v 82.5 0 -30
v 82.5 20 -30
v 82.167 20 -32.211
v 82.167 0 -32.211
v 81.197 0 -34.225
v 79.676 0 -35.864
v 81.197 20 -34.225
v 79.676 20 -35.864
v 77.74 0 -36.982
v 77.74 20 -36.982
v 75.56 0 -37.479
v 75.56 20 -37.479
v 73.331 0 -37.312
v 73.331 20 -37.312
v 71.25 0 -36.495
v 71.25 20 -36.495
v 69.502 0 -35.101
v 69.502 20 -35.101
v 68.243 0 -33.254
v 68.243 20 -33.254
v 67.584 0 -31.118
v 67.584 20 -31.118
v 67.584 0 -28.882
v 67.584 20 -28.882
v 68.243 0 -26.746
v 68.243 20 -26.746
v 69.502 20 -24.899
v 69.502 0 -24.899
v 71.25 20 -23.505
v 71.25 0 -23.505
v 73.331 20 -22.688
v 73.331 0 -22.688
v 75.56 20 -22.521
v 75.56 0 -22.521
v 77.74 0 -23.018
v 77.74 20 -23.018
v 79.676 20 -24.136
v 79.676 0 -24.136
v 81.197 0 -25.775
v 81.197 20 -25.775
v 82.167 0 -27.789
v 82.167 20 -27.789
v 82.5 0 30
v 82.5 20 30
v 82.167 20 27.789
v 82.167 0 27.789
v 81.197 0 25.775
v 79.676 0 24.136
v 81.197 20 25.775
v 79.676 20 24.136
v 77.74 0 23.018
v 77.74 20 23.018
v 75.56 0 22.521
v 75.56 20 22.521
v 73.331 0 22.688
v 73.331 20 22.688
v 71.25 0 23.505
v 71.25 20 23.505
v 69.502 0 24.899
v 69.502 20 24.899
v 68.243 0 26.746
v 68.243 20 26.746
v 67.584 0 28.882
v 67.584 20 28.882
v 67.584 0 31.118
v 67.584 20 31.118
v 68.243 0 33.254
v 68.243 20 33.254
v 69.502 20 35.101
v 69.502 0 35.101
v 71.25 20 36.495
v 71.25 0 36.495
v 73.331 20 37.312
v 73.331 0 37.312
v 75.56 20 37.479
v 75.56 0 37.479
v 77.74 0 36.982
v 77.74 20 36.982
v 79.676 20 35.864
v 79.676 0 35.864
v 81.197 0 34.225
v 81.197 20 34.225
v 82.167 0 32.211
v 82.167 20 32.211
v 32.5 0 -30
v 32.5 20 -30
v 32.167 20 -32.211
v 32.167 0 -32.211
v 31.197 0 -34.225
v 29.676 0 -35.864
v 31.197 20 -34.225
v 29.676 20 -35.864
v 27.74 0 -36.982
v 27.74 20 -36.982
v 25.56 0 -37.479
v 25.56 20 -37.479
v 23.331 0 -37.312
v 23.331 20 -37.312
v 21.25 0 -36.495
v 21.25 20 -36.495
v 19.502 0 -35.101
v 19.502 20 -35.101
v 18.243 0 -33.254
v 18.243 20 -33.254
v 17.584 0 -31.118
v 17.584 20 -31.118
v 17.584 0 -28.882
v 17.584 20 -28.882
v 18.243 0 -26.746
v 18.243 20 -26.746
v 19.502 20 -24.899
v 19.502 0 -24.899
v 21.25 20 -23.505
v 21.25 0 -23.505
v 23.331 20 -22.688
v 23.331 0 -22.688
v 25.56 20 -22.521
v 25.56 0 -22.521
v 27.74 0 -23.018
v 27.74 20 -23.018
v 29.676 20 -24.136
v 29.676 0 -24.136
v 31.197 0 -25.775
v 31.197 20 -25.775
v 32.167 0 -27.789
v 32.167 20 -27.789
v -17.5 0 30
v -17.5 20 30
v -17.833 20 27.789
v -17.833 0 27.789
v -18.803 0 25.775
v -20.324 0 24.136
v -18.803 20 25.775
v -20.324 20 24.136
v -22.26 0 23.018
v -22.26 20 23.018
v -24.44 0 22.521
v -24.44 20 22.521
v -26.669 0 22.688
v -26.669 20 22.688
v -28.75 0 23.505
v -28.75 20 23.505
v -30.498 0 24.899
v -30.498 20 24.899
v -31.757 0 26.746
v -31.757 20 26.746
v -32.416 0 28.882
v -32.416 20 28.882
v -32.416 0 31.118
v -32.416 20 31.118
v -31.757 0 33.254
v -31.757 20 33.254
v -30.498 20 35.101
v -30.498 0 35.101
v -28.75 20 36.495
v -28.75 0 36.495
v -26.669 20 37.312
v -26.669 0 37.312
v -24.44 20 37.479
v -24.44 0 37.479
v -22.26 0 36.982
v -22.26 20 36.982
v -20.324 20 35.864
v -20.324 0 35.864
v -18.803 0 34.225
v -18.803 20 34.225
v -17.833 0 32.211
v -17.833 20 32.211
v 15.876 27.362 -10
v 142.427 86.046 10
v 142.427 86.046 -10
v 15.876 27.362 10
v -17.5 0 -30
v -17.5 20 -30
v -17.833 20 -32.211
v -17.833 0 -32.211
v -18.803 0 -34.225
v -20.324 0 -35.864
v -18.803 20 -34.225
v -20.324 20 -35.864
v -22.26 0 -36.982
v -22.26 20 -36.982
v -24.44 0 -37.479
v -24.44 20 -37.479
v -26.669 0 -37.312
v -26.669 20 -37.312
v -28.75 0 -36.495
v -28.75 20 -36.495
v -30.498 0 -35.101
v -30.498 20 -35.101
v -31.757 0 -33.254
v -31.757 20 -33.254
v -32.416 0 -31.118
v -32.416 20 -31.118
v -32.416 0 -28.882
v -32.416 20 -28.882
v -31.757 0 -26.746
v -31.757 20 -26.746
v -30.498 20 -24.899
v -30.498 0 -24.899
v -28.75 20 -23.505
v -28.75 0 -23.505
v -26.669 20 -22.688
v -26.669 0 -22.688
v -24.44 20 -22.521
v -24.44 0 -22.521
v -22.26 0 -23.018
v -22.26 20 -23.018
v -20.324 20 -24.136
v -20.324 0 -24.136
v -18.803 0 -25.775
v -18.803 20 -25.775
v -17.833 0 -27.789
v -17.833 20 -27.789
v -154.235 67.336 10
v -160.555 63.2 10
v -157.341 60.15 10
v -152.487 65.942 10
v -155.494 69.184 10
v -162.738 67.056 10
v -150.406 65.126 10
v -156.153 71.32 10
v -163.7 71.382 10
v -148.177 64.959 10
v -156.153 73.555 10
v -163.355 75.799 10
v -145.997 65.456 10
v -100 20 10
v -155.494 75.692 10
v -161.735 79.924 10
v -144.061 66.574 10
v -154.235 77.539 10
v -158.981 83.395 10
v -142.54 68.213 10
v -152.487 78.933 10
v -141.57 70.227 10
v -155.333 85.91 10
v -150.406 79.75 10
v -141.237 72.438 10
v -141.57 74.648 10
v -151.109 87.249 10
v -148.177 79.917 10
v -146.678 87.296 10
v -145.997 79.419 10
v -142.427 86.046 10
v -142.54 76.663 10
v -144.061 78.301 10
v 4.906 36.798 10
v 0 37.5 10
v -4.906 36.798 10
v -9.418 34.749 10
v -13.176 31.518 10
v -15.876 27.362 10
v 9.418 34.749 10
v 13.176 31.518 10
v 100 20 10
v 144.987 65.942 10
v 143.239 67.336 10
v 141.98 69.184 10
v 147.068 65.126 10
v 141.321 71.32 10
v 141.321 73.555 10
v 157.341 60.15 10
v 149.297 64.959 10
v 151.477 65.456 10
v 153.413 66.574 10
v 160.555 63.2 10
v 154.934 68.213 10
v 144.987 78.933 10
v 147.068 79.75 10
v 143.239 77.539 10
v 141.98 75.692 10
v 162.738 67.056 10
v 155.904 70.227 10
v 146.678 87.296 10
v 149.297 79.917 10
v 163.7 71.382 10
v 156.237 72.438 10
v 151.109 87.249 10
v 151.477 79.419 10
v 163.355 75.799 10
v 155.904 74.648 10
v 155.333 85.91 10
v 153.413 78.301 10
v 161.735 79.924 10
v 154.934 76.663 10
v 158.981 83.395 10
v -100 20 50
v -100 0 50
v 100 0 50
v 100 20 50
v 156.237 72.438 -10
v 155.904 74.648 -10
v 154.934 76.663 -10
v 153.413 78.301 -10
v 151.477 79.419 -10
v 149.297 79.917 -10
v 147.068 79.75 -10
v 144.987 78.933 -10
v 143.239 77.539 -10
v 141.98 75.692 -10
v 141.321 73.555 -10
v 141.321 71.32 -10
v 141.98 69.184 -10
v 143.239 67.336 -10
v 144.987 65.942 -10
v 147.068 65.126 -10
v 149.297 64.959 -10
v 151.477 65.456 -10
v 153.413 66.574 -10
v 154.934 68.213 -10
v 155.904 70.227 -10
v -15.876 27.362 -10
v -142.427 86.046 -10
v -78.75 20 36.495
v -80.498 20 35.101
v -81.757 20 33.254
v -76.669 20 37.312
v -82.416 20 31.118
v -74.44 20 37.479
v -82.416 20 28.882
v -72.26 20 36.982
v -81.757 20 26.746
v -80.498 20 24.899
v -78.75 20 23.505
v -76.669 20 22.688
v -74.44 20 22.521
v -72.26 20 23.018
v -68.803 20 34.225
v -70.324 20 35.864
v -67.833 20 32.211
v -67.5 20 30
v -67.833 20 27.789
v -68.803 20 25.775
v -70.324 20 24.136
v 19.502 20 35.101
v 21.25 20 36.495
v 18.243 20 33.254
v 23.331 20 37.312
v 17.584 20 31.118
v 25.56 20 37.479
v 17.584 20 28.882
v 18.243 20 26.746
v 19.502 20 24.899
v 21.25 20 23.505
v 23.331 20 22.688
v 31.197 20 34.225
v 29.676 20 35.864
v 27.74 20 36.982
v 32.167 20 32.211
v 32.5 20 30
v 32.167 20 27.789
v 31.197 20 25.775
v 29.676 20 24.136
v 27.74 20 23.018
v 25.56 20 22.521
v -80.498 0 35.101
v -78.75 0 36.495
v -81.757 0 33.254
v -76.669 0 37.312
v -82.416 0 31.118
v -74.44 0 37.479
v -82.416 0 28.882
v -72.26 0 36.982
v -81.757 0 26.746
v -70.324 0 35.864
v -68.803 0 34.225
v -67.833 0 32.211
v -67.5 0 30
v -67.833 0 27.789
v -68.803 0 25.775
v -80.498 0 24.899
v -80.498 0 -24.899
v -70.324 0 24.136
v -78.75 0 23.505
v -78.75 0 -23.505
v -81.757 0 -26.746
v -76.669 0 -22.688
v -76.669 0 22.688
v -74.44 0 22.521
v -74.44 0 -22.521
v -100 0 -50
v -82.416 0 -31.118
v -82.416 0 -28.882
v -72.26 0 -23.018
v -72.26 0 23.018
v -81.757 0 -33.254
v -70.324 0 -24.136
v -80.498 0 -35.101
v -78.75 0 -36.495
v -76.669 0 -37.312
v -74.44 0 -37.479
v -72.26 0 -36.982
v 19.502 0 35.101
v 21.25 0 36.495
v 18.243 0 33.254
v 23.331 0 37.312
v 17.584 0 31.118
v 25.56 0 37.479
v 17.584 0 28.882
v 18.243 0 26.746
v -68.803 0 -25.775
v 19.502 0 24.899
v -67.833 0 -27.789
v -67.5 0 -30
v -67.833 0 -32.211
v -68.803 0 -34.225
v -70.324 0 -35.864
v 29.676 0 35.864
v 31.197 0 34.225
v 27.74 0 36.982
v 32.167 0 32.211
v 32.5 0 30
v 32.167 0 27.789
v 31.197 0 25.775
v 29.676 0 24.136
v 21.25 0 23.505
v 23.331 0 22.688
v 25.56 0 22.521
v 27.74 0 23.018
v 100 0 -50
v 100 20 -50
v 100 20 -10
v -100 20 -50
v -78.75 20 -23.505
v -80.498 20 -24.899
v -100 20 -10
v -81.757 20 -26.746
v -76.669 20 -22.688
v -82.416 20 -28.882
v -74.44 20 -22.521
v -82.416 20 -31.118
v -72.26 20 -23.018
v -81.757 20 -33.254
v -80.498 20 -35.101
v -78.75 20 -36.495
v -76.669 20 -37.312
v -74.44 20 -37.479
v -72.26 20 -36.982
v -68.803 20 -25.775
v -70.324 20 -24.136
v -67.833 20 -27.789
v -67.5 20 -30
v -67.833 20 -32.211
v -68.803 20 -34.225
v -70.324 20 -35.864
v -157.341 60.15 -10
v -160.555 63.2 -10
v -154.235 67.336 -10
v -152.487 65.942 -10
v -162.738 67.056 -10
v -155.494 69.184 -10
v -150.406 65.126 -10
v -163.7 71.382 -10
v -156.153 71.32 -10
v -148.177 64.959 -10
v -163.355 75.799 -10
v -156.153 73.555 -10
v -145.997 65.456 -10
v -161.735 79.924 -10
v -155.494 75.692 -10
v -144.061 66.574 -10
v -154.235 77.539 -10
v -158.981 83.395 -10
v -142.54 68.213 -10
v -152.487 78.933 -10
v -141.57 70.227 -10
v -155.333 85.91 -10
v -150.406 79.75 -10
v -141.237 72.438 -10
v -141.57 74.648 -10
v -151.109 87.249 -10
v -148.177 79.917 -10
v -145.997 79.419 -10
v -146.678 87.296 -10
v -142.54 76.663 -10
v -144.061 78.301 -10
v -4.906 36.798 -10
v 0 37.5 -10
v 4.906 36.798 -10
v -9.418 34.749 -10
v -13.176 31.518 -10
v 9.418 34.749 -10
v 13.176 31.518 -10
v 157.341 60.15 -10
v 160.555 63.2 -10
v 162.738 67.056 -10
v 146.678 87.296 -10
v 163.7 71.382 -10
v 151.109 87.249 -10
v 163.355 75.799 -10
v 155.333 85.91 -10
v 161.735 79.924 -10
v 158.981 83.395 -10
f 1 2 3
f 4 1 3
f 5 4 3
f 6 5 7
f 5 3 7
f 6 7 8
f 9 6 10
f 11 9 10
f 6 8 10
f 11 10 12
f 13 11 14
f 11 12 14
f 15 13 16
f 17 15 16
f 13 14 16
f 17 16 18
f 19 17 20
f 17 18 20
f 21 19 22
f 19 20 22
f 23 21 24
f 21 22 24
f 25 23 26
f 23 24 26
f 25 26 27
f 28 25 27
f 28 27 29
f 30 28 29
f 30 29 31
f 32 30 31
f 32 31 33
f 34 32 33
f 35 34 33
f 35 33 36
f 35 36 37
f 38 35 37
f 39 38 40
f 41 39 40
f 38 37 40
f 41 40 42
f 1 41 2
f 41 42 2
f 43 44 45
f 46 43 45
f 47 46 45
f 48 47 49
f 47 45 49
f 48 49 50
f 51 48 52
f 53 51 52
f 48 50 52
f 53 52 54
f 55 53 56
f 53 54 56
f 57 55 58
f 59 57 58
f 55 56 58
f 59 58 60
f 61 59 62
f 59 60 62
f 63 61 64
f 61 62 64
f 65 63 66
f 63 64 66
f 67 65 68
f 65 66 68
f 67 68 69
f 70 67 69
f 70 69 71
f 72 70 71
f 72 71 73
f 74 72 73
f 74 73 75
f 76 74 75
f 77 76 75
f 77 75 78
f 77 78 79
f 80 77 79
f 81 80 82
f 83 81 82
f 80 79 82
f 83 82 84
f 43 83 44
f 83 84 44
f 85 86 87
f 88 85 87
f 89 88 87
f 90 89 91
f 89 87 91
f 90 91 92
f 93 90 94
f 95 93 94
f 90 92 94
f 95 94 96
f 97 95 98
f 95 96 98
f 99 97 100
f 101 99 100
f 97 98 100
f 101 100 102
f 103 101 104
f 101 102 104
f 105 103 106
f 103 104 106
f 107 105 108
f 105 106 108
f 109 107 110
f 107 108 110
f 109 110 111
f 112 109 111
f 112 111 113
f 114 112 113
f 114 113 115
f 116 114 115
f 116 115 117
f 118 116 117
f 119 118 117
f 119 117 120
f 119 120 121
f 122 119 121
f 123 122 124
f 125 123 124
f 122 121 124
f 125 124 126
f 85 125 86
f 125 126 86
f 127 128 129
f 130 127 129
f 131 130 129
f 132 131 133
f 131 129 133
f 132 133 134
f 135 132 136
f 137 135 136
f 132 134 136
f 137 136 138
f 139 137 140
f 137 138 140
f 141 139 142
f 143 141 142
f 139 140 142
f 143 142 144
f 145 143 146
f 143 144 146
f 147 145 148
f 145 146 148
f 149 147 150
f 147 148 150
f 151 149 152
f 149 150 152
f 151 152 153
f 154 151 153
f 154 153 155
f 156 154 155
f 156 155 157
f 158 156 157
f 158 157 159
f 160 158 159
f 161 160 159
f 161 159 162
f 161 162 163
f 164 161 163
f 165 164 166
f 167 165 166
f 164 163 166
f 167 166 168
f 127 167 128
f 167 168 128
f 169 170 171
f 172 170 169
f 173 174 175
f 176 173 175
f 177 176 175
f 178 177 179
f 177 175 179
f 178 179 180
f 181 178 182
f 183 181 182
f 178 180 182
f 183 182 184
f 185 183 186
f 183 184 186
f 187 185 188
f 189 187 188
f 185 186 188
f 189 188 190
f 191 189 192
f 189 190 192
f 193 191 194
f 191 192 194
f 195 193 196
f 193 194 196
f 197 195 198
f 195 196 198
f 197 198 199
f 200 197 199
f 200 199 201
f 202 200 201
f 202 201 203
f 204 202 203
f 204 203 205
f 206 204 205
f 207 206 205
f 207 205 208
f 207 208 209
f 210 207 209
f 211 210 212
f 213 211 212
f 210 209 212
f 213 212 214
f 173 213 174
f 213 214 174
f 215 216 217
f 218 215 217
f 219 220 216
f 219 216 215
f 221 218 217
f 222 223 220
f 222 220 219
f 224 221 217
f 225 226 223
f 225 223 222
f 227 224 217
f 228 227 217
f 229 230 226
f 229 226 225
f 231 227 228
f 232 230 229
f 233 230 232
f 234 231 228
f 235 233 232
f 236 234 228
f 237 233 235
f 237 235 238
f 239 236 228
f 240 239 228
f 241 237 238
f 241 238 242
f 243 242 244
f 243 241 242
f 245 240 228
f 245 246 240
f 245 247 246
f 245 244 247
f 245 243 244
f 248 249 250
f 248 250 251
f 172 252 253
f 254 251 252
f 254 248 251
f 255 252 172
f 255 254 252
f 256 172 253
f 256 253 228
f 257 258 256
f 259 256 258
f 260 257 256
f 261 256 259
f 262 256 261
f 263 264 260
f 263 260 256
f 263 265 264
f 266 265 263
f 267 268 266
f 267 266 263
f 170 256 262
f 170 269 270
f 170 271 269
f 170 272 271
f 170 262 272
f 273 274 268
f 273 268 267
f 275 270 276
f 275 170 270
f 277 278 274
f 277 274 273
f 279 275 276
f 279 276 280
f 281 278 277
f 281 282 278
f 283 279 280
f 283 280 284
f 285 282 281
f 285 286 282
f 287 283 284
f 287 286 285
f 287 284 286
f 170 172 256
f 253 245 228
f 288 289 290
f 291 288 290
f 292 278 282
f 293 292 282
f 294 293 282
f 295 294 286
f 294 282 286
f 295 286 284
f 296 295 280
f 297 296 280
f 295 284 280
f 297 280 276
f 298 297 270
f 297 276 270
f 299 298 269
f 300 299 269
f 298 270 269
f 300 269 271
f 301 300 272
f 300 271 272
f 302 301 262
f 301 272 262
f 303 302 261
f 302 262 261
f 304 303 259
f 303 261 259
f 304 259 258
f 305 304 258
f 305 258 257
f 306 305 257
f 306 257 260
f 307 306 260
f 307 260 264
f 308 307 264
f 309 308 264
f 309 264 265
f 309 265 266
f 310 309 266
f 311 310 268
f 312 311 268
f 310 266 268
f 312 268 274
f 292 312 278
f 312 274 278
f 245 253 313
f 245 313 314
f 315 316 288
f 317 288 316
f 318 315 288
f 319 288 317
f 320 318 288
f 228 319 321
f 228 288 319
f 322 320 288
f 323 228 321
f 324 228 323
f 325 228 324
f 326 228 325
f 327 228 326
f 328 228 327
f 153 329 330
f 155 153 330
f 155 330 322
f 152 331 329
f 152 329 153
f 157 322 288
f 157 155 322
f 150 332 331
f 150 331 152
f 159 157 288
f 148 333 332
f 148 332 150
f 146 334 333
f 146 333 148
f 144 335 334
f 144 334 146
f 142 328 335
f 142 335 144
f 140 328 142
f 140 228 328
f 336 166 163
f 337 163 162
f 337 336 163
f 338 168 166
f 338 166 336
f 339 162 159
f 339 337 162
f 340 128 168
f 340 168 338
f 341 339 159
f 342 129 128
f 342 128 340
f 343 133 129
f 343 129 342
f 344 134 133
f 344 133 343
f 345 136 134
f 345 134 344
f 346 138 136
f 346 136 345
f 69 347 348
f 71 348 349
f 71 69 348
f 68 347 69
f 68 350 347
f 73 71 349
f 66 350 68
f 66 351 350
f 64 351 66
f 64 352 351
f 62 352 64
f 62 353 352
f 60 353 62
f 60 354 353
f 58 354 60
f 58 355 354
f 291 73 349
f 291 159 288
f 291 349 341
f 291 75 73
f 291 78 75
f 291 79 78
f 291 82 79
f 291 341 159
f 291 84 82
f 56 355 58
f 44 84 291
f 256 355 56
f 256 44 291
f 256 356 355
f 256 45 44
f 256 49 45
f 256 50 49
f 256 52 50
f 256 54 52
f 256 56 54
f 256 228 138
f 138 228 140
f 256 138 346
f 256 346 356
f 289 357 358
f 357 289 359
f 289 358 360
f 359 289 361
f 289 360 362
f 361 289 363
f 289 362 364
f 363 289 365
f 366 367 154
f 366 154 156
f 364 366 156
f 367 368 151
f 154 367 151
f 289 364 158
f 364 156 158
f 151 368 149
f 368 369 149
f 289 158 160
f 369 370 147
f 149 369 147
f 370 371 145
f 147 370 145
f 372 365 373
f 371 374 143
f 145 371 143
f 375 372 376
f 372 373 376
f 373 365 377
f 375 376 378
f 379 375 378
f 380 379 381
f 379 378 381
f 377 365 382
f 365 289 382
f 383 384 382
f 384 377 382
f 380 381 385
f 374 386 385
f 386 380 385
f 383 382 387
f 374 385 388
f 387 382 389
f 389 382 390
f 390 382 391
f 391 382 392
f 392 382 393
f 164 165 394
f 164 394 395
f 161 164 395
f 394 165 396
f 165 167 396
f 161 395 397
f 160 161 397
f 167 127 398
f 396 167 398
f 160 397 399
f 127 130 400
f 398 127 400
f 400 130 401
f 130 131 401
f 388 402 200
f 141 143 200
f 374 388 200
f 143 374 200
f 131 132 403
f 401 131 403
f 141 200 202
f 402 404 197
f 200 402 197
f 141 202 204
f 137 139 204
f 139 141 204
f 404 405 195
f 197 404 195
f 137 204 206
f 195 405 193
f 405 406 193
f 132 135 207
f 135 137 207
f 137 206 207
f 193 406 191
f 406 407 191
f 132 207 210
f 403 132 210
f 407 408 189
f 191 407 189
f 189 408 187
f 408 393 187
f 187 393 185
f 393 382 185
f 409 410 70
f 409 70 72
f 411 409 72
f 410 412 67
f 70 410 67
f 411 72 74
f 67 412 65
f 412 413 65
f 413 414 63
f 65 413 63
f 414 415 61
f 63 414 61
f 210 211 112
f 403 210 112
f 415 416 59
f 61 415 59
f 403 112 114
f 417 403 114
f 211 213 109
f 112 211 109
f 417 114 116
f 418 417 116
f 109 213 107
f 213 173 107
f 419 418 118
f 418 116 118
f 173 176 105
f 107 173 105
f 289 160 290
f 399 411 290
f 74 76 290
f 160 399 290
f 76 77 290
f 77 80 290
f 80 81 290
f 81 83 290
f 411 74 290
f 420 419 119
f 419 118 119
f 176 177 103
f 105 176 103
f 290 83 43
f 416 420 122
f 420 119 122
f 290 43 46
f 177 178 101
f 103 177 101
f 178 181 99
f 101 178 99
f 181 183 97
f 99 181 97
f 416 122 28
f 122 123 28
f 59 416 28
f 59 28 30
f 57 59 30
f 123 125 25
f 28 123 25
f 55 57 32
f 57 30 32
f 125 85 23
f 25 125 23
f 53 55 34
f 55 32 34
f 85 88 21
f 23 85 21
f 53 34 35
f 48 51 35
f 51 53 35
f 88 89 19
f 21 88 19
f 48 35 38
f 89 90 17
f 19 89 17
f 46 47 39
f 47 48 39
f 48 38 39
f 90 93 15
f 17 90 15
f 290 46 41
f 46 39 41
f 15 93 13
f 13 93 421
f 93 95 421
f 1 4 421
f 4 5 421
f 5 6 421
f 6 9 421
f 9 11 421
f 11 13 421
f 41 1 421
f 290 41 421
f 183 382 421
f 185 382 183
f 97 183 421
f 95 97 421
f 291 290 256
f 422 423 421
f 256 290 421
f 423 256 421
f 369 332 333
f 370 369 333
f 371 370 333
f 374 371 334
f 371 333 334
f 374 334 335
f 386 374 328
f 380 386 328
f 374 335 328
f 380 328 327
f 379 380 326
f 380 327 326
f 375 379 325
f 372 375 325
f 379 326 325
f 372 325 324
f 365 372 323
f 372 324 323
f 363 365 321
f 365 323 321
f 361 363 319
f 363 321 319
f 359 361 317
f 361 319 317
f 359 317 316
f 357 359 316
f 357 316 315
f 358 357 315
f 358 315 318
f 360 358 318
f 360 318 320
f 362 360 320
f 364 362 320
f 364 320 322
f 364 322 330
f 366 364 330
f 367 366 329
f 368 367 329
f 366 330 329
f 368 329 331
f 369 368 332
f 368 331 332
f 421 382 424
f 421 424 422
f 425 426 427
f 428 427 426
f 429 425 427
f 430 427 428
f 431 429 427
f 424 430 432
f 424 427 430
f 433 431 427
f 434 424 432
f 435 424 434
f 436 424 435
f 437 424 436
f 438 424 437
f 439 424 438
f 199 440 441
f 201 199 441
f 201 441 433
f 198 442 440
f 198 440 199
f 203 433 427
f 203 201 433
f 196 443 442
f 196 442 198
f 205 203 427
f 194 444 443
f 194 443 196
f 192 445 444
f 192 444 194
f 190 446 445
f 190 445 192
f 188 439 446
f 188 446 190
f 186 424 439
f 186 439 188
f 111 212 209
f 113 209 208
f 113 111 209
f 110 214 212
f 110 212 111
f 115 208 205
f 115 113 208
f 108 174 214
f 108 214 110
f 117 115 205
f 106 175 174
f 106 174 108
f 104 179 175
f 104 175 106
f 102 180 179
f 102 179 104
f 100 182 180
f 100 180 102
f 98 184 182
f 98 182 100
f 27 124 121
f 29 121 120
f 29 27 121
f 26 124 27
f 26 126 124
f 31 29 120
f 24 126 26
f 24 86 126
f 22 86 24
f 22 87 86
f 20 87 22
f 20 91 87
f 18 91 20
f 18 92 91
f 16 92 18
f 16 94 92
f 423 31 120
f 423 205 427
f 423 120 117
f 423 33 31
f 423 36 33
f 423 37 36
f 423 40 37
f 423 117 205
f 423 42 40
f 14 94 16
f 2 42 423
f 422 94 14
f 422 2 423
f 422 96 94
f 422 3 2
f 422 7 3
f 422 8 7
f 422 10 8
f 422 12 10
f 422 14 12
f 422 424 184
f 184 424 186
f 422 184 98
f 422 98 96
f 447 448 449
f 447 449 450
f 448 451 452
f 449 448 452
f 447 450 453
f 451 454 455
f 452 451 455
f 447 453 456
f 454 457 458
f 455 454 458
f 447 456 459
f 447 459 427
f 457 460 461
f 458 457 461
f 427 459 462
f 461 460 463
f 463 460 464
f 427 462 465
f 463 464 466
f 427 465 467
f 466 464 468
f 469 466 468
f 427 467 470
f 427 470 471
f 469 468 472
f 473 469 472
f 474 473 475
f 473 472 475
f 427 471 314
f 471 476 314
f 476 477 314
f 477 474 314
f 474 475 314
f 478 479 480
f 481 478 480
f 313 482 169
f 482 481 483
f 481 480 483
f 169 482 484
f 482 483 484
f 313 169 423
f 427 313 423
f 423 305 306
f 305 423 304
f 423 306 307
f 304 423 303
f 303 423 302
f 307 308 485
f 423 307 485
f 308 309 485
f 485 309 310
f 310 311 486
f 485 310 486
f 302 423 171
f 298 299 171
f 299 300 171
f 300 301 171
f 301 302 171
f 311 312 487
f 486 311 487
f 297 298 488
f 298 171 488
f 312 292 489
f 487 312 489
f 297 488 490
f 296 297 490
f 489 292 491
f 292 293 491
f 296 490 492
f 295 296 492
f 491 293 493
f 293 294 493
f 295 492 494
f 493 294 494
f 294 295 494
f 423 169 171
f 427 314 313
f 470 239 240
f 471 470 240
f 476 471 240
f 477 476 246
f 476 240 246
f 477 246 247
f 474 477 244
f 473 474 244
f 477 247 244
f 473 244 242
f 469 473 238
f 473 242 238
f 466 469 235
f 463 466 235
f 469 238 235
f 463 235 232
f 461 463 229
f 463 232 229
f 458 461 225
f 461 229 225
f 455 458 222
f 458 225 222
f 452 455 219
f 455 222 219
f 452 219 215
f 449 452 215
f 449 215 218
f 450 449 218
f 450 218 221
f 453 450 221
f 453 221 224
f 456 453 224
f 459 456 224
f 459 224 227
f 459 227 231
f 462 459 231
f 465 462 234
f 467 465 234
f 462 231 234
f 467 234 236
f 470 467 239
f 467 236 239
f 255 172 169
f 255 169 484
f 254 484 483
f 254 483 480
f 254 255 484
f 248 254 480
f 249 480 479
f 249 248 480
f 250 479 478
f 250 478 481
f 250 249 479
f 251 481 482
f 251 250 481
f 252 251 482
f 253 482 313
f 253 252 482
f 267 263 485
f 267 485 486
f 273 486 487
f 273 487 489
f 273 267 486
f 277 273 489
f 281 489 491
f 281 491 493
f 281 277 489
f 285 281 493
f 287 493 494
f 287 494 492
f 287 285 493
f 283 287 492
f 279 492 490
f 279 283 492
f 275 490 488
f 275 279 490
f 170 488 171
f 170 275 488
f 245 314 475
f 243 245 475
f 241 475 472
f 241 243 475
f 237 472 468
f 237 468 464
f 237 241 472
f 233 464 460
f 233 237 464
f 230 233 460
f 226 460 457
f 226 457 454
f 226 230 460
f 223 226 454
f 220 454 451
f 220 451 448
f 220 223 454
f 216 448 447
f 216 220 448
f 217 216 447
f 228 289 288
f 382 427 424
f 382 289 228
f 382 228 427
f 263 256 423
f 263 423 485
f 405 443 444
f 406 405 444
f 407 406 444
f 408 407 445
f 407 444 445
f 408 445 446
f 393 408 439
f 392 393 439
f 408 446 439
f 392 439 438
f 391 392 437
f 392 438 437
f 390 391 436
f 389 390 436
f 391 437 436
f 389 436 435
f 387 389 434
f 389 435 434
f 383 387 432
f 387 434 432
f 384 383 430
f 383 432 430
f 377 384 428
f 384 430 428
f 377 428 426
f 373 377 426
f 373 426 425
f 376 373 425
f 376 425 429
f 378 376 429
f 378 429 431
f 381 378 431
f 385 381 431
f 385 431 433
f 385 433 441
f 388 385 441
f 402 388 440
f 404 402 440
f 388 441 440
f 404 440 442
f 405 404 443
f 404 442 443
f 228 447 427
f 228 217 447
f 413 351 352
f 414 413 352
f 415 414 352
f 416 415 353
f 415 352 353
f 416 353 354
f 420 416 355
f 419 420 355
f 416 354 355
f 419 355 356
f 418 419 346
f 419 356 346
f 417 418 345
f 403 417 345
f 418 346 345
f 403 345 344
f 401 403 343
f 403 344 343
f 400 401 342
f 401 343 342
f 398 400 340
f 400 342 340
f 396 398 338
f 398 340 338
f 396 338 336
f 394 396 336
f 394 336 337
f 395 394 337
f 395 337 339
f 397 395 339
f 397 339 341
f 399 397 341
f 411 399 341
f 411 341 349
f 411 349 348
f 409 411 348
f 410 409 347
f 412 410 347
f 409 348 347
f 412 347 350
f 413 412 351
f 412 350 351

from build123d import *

# Parameters (mm, degrees)
SKETCH1_W           = 200
SKETCH1_H           = 100
BOSS_EXTRUDE1_DEPTH = 20
SKETCH2_R           = 7.5
CUT_EXTRUDE1_DEPTH  = 20
BOSS_EXTRUDE2_DEPTH = 10
SKETCH4_R           = 7.5
CUT_EXTRUDE2_DEPTH  = 20


with BuildPart() as part:
    # Sketch1 → Boss-Extrude1 (new body)
    with BuildSketch(Plane(origin=(0, 0, 0), x_dir=(1, 0, 0), z_dir=(0, 1, 0))):
        Rectangle(SKETCH1_W, SKETCH1_H)
    extrude(amount=BOSS_EXTRUDE1_DEPTH)

    # Sketch2 → Cut-Extrude1 (cut)
    with BuildSketch(Plane(origin=(0, 20, 0), x_dir=(1, 0, 0), z_dir=(0, 1, 0))):
        with Locations((-75, 30)):
            Circle(SKETCH2_R)
        with Locations((-25, 30)):
            Circle(SKETCH2_R)
        with Locations((25, 30)):
            Circle(SKETCH2_R)
        with Locations((75, 30)):
            Circle(SKETCH2_R)
        with Locations((-75, -30)):
            Circle(SKETCH2_R)
        with Locations((-25, -30)):
            Circle(SKETCH2_R)
        with Locations((25, -30)):
            Circle(SKETCH2_R)
        with Locations((75, -30)):
            Circle(SKETCH2_R)
    extrude(amount=-CUT_EXTRUDE1_DEPTH, mode=Mode.SUBTRACT)

    # Sketch3 → Boss-Extrude2 (add, symmetric)
    with BuildSketch(Plane.XY):
        with BuildLine():
            Line((-100, 20), (100, 20))
            Line((100, 20), (157.3406431, 60.150350545))
            ThreePointArc((157.3406431, 60.150350545), (161.735357089, 79.923793338), (142.426691144, 86.045718717))
            Line((142.426691144, 86.045718717), (15.876102092, 27.36202298))
            ThreePointArc((15.876102092, 27.36202298), (0, 37.5), (-15.876102092, 27.36202298))
            Line((-15.876102092, 27.36202298), (-142.426691144, 86.045718717))
            ThreePointArc((-142.426691144, 86.045718717), (-161.735357089, 79.923793338), (-157.3406431, 60.150350545))
            Line((-157.3406431, 60.150350545), (-100, 20))
        make_face()
    extrude(amount=BOSS_EXTRUDE2_DEPTH, both=True)

    # Sketch4 → Cut-Extrude2 (cut)
    with BuildSketch(Plane.XY.offset(10)):
        with Locations((148.736996555, 72.437631209)):
            Circle(SKETCH4_R)
        with Locations((-148.736996555, 72.437631209)):
            Circle(SKETCH4_R)
    extrude(amount=-CUT_EXTRUDE2_DEPTH, mode=Mode.SUBTRACT)


solid = part.part
